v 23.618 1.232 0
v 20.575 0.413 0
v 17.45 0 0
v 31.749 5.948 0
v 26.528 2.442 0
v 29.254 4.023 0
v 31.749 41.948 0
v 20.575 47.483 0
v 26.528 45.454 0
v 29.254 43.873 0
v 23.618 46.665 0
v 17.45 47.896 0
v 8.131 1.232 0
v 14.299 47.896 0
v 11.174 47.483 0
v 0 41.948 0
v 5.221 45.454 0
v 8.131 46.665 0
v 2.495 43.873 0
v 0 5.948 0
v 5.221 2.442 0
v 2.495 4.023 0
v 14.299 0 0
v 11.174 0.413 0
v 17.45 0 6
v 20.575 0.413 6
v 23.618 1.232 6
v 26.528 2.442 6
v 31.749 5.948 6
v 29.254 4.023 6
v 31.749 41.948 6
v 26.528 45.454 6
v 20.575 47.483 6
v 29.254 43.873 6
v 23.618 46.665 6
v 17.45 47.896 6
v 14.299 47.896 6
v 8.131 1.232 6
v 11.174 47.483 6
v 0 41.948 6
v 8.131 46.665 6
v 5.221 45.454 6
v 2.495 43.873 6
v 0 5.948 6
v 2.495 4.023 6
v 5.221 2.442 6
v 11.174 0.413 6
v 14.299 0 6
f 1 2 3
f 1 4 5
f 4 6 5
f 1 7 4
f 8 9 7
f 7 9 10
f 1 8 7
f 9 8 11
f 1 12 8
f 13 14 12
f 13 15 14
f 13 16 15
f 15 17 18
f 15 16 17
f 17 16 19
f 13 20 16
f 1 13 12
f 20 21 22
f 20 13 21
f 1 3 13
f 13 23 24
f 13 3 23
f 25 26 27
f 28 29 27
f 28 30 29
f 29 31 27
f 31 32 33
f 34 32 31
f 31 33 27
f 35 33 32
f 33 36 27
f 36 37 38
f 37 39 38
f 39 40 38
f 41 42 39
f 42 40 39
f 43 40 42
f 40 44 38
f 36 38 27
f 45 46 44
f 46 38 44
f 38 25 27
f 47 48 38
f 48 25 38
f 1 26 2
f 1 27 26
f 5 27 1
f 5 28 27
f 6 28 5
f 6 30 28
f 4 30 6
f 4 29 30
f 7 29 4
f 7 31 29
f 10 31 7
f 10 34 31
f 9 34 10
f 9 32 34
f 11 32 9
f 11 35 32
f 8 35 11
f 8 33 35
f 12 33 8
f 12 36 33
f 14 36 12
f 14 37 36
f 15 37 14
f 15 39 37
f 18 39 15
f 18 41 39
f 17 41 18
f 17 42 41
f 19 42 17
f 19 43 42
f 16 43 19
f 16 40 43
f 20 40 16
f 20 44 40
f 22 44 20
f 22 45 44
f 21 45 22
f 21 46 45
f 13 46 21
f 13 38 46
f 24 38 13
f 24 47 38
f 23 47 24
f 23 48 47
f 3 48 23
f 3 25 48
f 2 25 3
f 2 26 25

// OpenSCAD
$fn = 32;

// ----------------------------------------------------------------------
// Eccentric disc: double_d, 6 mm thick
// ----------------------------------------------------------------------

// --- parameters (mm) ---
profile_height = 6;       // extrusion height
profile_points = 24;      // points of the closed outline

profile = [[31.749, 41.948], [29.254, 43.873], [26.528, 45.454], [23.618, 46.665], [20.575, 47.483], [17.45, 47.896], [14.299, 47.896], [11.174, 47.483], [8.131, 46.665], [5.221, 45.454], [2.495, 43.873], [0, 41.948], [0, 5.948], [2.495, 4.023], [5.221, 2.442], [8.131, 1.232], [11.174, 0.413], [14.299, 0], [17.45, 0], [20.575, 0.413], [23.618, 1.232], [26.528, 2.442], [29.254, 4.023], [31.749, 5.948]];  // single closed polygon, 24 points, counter clockwise

// --- the one profile operation ---
linear_extrude(height = profile_height) polygon(points = profile);
